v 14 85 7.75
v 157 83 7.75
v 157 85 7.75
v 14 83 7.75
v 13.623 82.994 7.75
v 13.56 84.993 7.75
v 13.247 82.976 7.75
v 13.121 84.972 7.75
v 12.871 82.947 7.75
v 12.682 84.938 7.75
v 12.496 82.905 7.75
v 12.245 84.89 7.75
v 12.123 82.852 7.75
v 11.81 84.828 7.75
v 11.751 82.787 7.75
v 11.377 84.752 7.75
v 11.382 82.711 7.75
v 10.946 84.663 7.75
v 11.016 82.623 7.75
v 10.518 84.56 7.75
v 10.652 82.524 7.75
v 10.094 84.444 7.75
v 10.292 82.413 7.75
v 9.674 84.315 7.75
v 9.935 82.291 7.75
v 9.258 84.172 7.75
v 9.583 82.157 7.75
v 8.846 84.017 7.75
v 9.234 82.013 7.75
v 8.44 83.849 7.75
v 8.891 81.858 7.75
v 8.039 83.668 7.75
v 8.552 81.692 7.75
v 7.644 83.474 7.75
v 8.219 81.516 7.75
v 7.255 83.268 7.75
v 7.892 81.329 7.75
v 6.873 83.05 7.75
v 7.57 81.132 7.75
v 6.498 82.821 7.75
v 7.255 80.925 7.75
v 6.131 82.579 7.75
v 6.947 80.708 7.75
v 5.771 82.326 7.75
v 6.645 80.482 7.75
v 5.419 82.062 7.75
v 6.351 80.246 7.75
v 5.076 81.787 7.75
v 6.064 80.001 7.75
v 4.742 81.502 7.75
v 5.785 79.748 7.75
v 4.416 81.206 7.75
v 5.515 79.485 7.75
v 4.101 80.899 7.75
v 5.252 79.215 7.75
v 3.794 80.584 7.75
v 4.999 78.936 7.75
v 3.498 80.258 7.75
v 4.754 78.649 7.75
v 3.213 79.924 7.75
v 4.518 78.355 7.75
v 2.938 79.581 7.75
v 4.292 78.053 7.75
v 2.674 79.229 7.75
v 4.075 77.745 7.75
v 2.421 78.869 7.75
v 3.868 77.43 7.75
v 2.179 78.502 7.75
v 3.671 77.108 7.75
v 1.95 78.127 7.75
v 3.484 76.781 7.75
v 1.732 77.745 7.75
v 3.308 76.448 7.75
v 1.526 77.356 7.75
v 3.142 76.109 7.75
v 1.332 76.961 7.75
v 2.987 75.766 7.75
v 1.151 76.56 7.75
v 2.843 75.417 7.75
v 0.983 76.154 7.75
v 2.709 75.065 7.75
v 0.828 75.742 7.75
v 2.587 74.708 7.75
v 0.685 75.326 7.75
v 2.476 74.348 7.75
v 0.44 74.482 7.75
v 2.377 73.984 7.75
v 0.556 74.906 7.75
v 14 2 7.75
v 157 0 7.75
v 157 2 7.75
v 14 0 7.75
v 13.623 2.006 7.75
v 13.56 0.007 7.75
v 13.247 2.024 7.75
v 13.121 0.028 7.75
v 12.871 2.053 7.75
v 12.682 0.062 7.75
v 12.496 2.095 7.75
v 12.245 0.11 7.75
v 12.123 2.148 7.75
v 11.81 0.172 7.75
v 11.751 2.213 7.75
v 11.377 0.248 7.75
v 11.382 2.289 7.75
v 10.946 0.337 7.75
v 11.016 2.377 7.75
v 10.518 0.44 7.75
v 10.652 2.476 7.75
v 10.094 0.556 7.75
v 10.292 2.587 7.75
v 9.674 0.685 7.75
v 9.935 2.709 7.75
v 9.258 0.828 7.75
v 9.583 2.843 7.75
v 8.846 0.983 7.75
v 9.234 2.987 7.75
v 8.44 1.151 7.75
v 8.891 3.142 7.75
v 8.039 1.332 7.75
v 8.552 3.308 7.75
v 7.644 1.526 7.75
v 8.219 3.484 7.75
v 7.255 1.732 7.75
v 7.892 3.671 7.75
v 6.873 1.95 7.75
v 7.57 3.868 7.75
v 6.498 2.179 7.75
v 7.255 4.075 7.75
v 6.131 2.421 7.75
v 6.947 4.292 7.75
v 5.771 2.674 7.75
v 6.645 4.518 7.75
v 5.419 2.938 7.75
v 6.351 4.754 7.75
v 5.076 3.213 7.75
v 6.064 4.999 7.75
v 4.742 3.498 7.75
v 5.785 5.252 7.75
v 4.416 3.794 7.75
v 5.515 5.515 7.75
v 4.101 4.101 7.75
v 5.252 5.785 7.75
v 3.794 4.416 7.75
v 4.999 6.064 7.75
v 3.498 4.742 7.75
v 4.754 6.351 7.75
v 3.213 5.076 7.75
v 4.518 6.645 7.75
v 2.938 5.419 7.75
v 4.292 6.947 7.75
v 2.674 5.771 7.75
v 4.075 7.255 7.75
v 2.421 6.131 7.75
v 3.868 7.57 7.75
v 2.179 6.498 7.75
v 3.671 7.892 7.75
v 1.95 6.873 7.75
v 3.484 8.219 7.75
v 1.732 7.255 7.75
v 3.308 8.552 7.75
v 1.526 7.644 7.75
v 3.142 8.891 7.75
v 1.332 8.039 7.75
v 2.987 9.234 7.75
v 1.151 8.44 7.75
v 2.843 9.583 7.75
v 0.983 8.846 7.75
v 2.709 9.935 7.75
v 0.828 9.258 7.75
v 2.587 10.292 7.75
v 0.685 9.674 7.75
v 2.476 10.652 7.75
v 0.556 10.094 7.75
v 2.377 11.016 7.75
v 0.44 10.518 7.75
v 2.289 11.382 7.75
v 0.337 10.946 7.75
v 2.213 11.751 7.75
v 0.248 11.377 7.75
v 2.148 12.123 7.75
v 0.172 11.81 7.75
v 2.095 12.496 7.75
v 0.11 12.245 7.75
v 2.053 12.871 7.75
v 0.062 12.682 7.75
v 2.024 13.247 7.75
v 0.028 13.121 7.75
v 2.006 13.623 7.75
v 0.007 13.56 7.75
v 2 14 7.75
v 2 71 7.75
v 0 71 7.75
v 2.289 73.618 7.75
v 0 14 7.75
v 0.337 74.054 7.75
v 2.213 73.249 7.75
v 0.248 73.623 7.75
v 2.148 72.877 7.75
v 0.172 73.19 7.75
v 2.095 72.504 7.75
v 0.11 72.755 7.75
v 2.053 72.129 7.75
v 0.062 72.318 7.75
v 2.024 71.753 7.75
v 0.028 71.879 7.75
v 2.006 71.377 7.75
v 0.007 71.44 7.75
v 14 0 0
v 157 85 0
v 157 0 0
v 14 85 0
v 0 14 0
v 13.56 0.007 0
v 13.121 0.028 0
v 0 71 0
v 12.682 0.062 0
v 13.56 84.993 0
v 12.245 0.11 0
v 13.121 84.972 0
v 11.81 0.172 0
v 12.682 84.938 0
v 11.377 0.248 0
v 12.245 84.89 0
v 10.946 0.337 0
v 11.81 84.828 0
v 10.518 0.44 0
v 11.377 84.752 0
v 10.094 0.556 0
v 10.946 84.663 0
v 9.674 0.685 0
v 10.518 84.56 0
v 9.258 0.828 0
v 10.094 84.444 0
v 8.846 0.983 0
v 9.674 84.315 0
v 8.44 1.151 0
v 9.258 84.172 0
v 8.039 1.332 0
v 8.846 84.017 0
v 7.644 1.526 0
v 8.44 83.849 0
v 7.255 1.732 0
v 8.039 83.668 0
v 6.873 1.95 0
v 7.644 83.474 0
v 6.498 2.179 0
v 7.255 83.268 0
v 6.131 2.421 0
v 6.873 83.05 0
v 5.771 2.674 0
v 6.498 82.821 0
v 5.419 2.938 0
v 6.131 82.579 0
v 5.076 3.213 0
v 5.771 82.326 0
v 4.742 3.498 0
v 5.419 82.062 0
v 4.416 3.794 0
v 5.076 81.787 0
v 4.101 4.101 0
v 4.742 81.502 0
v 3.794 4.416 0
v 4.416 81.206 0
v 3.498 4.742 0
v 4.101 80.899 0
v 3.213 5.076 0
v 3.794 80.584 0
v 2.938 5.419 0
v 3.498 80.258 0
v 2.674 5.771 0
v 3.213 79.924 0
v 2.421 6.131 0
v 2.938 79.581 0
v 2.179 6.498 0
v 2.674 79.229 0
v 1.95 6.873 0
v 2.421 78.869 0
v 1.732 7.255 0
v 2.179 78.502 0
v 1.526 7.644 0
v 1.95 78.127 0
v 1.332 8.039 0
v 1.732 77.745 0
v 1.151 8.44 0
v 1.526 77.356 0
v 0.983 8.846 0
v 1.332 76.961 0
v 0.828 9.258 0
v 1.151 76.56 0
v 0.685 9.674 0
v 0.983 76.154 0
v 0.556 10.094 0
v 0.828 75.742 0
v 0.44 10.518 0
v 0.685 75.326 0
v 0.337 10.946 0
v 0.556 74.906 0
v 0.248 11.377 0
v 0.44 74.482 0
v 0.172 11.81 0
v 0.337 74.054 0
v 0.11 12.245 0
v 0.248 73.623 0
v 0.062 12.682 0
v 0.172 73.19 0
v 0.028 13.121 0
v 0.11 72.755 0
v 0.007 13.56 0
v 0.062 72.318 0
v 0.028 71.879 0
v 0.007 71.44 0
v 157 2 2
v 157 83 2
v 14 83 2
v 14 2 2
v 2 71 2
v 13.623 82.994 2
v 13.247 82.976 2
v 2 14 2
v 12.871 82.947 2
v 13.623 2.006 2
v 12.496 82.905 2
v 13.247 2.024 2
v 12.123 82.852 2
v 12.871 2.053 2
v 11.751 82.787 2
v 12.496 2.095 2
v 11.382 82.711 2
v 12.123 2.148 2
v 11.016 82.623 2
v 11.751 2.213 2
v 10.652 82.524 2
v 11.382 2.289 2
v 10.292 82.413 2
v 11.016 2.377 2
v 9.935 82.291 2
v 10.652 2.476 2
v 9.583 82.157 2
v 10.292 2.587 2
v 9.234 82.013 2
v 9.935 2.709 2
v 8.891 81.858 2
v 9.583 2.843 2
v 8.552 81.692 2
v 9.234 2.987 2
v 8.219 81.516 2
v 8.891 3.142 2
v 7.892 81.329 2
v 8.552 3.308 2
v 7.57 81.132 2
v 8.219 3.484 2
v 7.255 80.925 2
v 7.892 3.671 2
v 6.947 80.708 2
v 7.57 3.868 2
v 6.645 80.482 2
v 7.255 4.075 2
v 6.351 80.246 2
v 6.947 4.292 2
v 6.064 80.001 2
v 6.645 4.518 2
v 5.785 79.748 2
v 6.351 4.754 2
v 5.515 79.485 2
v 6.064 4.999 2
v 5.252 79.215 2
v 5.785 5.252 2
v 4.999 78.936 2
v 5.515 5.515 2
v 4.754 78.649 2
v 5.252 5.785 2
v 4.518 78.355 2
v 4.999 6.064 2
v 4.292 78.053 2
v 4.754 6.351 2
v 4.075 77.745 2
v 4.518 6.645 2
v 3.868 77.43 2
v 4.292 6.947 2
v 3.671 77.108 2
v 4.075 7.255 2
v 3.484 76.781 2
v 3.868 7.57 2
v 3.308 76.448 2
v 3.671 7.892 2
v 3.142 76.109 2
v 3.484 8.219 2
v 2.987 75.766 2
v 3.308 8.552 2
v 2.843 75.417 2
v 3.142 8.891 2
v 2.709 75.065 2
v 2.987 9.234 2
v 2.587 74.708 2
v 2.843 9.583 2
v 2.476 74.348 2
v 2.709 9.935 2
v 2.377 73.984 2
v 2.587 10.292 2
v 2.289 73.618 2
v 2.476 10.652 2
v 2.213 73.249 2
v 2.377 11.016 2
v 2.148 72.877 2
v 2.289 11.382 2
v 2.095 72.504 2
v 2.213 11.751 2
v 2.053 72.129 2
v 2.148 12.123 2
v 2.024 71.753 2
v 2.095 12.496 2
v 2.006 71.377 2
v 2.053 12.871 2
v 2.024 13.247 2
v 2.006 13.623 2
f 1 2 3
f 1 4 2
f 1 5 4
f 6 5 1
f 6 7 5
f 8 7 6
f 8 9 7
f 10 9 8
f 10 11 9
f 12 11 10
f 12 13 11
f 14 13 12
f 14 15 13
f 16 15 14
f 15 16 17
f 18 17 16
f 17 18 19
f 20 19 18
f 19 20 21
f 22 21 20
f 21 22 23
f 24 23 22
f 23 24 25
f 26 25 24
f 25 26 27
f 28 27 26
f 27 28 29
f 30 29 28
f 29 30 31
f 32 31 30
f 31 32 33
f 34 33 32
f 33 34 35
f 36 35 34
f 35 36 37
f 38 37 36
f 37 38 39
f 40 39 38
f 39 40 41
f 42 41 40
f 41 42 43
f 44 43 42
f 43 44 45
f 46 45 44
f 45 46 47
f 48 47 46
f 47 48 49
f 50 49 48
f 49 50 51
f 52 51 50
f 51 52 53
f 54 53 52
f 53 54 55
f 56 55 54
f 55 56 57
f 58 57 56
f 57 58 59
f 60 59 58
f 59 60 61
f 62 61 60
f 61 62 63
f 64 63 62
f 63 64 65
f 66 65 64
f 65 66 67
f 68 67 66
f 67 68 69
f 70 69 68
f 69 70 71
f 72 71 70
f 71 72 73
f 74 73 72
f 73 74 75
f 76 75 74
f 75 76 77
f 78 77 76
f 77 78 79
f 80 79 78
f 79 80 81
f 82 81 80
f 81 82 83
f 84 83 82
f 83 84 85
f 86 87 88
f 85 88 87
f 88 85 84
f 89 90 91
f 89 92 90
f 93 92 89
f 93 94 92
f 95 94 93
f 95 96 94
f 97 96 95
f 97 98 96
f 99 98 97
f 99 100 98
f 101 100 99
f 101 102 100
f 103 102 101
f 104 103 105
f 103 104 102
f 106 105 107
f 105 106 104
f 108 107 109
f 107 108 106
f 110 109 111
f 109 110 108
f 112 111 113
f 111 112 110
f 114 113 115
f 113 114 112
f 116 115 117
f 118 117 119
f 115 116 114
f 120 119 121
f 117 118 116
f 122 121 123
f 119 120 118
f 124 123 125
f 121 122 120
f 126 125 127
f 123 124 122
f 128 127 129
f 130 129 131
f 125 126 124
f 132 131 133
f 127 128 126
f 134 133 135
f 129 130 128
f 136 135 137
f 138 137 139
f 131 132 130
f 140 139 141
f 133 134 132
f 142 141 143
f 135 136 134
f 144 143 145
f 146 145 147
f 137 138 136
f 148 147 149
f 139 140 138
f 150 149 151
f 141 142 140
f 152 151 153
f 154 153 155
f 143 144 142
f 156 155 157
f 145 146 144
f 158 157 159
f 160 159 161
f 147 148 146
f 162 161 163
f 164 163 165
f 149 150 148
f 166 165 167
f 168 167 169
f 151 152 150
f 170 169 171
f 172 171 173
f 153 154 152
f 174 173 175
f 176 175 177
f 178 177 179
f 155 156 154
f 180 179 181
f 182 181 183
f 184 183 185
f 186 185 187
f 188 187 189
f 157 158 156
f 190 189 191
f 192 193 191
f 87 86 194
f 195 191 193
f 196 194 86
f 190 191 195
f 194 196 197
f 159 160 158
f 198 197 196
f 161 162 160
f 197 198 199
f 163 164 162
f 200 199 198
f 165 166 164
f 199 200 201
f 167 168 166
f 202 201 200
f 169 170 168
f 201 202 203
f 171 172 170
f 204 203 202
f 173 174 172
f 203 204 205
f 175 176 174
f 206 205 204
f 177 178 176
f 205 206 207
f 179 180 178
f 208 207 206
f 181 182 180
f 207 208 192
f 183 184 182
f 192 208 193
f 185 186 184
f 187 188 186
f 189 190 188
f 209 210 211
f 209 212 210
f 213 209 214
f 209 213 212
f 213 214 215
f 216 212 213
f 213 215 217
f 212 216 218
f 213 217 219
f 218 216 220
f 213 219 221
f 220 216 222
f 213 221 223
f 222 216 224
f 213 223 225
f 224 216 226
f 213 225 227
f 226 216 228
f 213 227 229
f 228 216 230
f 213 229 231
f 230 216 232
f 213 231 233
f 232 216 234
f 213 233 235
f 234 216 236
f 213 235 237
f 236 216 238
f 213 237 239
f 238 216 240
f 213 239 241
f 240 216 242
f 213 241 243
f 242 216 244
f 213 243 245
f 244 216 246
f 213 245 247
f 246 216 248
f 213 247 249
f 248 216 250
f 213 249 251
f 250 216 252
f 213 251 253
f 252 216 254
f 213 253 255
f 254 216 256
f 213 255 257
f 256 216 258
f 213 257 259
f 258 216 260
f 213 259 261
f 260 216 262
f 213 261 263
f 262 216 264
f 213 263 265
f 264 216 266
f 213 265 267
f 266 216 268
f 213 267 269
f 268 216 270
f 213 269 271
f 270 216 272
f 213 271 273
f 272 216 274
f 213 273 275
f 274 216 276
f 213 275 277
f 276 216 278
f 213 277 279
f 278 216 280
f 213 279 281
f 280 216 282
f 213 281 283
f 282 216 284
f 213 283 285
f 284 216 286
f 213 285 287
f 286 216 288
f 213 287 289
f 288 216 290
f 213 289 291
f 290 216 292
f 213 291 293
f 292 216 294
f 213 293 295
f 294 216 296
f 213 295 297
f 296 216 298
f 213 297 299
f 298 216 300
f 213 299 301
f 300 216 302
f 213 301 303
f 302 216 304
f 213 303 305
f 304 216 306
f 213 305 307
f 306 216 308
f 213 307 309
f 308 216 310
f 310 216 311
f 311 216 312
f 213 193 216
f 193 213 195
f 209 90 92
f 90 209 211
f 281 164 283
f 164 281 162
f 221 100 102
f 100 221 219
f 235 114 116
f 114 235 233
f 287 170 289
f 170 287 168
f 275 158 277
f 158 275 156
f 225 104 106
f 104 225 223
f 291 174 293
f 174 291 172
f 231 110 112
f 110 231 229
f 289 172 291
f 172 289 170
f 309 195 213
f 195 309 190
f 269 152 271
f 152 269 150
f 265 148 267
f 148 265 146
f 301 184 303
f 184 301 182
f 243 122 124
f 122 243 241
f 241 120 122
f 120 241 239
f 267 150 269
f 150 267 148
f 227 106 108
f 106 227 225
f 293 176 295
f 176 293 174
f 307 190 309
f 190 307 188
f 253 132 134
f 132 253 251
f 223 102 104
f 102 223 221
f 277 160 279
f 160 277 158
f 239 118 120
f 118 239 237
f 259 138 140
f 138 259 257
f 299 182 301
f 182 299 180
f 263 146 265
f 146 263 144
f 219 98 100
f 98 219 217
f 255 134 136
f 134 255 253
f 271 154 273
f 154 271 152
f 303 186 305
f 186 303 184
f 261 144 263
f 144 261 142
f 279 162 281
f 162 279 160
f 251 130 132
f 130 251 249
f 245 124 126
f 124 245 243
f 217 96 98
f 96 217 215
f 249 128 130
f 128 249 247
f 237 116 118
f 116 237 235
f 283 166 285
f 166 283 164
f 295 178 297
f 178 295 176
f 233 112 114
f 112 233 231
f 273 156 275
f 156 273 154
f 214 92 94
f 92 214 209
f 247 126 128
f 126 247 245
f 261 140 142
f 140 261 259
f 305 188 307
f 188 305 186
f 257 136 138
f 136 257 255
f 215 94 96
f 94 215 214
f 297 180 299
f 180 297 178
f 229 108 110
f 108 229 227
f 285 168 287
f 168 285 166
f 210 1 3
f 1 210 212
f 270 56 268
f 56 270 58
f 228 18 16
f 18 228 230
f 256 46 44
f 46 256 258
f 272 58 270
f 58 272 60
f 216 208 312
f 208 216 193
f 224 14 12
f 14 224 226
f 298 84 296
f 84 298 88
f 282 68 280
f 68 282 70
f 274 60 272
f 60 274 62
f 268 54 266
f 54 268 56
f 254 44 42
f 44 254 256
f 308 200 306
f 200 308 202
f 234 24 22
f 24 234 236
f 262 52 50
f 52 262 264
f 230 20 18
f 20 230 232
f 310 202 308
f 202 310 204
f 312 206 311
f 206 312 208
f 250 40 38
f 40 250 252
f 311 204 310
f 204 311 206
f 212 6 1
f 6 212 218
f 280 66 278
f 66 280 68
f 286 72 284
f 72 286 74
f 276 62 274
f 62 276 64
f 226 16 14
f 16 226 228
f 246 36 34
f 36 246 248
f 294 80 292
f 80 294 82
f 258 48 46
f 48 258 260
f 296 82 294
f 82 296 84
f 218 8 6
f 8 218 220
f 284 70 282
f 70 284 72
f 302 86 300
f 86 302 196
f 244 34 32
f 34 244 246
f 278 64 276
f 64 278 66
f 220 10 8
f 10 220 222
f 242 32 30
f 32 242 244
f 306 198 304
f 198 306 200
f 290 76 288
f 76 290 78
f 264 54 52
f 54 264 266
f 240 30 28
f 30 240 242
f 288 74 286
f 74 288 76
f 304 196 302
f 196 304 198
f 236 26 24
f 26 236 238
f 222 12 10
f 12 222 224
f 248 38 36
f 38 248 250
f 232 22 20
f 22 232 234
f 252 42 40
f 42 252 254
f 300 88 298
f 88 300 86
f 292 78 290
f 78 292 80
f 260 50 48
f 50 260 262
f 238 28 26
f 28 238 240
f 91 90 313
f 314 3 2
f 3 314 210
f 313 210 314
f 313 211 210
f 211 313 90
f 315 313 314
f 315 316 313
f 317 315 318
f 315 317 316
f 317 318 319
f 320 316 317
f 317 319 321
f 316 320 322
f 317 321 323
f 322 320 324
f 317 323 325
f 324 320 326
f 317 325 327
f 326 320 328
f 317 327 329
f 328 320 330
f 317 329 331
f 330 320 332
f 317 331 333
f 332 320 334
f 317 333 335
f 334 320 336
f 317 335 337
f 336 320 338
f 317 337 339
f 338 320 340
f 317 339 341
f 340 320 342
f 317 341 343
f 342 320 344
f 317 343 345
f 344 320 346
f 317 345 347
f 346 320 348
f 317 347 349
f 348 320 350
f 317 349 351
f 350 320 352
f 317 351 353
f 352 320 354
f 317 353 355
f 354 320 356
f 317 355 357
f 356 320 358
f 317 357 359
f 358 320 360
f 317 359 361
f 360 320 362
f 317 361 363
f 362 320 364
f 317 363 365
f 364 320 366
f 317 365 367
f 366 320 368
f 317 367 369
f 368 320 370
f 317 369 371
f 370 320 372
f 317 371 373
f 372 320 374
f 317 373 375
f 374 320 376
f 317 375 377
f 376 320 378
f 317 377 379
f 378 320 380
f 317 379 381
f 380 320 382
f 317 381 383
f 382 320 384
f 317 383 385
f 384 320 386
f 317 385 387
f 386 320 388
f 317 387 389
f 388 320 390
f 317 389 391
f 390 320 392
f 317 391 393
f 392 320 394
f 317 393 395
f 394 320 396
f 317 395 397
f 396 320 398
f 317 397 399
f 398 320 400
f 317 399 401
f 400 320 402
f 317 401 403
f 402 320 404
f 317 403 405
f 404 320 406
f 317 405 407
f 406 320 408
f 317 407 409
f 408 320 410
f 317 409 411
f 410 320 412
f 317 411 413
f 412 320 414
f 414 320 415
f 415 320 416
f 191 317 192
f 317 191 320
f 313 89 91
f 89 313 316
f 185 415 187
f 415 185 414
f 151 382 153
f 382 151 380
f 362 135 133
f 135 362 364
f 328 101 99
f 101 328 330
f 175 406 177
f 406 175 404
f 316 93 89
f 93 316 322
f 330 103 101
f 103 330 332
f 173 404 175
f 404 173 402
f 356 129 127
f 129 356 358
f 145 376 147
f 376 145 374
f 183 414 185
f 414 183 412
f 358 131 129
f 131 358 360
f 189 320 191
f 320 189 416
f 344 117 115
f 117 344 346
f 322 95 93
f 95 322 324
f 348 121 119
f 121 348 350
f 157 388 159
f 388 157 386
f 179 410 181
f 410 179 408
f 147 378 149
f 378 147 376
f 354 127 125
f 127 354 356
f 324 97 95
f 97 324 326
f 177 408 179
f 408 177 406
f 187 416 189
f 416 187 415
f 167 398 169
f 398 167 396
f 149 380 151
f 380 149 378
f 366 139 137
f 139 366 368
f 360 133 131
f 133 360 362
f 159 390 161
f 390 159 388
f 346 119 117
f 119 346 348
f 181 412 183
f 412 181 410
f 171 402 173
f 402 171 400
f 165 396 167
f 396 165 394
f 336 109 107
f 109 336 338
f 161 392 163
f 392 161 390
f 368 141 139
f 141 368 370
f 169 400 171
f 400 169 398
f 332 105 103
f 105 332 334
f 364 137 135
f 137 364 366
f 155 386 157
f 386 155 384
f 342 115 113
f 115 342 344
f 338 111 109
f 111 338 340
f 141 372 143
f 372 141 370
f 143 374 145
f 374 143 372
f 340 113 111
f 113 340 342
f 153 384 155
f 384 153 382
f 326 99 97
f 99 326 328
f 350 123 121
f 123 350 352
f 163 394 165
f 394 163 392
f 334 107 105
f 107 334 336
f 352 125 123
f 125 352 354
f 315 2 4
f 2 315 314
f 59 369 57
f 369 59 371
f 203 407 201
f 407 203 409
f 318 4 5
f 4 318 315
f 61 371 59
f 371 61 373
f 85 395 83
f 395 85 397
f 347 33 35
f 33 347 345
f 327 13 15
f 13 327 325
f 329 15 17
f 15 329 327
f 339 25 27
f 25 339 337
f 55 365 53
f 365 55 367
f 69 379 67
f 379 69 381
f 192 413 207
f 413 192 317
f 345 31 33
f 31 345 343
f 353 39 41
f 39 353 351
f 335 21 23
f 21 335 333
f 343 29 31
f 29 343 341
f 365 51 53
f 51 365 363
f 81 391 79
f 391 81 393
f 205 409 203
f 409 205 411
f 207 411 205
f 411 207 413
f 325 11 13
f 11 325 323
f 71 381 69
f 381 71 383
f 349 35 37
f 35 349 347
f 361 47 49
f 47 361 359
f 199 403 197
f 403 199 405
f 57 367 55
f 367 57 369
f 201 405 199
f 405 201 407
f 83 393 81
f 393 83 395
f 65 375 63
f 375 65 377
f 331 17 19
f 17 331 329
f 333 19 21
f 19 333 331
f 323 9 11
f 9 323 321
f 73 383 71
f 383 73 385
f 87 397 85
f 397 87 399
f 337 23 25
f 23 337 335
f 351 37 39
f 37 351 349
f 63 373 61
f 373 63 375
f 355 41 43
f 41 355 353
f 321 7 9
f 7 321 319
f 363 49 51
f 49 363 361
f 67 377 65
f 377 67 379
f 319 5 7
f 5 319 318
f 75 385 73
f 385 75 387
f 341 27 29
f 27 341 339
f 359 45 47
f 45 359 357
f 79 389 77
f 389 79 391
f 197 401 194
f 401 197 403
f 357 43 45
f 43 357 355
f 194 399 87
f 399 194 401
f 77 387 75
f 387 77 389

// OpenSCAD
//
// Gallaxy S5 with otterbox defender pocket protector

//dimensions (all in mm)
FN = 200;//$fn for cylinders
//FN = 34;//$fn for cylinders

L = 155;
W = 81;
H = 5.75;
THK = 2;
R = 12;
R_O = R+THK;

cover();

module cover()
{
    //translate([30,30,30])
    difference()
    {
        cover_body();
        translate([THK,THK,THK])
        S5_body([50,50,50]);
    }
}

module cover_body()
{
    difference()
    {
        cube([L+THK,W+2*THK,H+THK]);
        //union()
        {
            //subtract the first corner
            difference()
            {
                cube([R_O, R_O,(H+THK)]);
                translate([R_O,R_O,0])
                rotate([0,0,180])
                    cylinder(H+THK, r=R_O, $fn = FN);
            }
            //subtract the second corner
            translate([0,(W+2*THK)-2*R_O,0])
            difference()
            {
                translate([0,R_O,0])
                cube([R_O, R_O,(H+THK)]);
                translate([R_O,R_O,0])
                rotate([0,0,180])
                cylinder(H+THK, r=R_O, $fn = FN);
            }
        }
    }
}

module S5_body()
{
    difference()
    {
        cube([L,W,H]);
        //union()
        {
            //subtract the first corner
            difference()
            {
                cube([R, R,(H)]);
                translate([R,R,0])
                rotate([0,0,180])
                    cylinder(H, r=R, $fn = FN);
            }
            //subtract the second corner
            translate([0,(W)-2*R,0])
            difference()
            {
                translate([0,R,0])
                cube([R, R,(H)]);
                translate([R,R,0])
                rotate([0,0,180])
                cylinder(H, r=R, $fn = FN);
            }
        }
    }
}

